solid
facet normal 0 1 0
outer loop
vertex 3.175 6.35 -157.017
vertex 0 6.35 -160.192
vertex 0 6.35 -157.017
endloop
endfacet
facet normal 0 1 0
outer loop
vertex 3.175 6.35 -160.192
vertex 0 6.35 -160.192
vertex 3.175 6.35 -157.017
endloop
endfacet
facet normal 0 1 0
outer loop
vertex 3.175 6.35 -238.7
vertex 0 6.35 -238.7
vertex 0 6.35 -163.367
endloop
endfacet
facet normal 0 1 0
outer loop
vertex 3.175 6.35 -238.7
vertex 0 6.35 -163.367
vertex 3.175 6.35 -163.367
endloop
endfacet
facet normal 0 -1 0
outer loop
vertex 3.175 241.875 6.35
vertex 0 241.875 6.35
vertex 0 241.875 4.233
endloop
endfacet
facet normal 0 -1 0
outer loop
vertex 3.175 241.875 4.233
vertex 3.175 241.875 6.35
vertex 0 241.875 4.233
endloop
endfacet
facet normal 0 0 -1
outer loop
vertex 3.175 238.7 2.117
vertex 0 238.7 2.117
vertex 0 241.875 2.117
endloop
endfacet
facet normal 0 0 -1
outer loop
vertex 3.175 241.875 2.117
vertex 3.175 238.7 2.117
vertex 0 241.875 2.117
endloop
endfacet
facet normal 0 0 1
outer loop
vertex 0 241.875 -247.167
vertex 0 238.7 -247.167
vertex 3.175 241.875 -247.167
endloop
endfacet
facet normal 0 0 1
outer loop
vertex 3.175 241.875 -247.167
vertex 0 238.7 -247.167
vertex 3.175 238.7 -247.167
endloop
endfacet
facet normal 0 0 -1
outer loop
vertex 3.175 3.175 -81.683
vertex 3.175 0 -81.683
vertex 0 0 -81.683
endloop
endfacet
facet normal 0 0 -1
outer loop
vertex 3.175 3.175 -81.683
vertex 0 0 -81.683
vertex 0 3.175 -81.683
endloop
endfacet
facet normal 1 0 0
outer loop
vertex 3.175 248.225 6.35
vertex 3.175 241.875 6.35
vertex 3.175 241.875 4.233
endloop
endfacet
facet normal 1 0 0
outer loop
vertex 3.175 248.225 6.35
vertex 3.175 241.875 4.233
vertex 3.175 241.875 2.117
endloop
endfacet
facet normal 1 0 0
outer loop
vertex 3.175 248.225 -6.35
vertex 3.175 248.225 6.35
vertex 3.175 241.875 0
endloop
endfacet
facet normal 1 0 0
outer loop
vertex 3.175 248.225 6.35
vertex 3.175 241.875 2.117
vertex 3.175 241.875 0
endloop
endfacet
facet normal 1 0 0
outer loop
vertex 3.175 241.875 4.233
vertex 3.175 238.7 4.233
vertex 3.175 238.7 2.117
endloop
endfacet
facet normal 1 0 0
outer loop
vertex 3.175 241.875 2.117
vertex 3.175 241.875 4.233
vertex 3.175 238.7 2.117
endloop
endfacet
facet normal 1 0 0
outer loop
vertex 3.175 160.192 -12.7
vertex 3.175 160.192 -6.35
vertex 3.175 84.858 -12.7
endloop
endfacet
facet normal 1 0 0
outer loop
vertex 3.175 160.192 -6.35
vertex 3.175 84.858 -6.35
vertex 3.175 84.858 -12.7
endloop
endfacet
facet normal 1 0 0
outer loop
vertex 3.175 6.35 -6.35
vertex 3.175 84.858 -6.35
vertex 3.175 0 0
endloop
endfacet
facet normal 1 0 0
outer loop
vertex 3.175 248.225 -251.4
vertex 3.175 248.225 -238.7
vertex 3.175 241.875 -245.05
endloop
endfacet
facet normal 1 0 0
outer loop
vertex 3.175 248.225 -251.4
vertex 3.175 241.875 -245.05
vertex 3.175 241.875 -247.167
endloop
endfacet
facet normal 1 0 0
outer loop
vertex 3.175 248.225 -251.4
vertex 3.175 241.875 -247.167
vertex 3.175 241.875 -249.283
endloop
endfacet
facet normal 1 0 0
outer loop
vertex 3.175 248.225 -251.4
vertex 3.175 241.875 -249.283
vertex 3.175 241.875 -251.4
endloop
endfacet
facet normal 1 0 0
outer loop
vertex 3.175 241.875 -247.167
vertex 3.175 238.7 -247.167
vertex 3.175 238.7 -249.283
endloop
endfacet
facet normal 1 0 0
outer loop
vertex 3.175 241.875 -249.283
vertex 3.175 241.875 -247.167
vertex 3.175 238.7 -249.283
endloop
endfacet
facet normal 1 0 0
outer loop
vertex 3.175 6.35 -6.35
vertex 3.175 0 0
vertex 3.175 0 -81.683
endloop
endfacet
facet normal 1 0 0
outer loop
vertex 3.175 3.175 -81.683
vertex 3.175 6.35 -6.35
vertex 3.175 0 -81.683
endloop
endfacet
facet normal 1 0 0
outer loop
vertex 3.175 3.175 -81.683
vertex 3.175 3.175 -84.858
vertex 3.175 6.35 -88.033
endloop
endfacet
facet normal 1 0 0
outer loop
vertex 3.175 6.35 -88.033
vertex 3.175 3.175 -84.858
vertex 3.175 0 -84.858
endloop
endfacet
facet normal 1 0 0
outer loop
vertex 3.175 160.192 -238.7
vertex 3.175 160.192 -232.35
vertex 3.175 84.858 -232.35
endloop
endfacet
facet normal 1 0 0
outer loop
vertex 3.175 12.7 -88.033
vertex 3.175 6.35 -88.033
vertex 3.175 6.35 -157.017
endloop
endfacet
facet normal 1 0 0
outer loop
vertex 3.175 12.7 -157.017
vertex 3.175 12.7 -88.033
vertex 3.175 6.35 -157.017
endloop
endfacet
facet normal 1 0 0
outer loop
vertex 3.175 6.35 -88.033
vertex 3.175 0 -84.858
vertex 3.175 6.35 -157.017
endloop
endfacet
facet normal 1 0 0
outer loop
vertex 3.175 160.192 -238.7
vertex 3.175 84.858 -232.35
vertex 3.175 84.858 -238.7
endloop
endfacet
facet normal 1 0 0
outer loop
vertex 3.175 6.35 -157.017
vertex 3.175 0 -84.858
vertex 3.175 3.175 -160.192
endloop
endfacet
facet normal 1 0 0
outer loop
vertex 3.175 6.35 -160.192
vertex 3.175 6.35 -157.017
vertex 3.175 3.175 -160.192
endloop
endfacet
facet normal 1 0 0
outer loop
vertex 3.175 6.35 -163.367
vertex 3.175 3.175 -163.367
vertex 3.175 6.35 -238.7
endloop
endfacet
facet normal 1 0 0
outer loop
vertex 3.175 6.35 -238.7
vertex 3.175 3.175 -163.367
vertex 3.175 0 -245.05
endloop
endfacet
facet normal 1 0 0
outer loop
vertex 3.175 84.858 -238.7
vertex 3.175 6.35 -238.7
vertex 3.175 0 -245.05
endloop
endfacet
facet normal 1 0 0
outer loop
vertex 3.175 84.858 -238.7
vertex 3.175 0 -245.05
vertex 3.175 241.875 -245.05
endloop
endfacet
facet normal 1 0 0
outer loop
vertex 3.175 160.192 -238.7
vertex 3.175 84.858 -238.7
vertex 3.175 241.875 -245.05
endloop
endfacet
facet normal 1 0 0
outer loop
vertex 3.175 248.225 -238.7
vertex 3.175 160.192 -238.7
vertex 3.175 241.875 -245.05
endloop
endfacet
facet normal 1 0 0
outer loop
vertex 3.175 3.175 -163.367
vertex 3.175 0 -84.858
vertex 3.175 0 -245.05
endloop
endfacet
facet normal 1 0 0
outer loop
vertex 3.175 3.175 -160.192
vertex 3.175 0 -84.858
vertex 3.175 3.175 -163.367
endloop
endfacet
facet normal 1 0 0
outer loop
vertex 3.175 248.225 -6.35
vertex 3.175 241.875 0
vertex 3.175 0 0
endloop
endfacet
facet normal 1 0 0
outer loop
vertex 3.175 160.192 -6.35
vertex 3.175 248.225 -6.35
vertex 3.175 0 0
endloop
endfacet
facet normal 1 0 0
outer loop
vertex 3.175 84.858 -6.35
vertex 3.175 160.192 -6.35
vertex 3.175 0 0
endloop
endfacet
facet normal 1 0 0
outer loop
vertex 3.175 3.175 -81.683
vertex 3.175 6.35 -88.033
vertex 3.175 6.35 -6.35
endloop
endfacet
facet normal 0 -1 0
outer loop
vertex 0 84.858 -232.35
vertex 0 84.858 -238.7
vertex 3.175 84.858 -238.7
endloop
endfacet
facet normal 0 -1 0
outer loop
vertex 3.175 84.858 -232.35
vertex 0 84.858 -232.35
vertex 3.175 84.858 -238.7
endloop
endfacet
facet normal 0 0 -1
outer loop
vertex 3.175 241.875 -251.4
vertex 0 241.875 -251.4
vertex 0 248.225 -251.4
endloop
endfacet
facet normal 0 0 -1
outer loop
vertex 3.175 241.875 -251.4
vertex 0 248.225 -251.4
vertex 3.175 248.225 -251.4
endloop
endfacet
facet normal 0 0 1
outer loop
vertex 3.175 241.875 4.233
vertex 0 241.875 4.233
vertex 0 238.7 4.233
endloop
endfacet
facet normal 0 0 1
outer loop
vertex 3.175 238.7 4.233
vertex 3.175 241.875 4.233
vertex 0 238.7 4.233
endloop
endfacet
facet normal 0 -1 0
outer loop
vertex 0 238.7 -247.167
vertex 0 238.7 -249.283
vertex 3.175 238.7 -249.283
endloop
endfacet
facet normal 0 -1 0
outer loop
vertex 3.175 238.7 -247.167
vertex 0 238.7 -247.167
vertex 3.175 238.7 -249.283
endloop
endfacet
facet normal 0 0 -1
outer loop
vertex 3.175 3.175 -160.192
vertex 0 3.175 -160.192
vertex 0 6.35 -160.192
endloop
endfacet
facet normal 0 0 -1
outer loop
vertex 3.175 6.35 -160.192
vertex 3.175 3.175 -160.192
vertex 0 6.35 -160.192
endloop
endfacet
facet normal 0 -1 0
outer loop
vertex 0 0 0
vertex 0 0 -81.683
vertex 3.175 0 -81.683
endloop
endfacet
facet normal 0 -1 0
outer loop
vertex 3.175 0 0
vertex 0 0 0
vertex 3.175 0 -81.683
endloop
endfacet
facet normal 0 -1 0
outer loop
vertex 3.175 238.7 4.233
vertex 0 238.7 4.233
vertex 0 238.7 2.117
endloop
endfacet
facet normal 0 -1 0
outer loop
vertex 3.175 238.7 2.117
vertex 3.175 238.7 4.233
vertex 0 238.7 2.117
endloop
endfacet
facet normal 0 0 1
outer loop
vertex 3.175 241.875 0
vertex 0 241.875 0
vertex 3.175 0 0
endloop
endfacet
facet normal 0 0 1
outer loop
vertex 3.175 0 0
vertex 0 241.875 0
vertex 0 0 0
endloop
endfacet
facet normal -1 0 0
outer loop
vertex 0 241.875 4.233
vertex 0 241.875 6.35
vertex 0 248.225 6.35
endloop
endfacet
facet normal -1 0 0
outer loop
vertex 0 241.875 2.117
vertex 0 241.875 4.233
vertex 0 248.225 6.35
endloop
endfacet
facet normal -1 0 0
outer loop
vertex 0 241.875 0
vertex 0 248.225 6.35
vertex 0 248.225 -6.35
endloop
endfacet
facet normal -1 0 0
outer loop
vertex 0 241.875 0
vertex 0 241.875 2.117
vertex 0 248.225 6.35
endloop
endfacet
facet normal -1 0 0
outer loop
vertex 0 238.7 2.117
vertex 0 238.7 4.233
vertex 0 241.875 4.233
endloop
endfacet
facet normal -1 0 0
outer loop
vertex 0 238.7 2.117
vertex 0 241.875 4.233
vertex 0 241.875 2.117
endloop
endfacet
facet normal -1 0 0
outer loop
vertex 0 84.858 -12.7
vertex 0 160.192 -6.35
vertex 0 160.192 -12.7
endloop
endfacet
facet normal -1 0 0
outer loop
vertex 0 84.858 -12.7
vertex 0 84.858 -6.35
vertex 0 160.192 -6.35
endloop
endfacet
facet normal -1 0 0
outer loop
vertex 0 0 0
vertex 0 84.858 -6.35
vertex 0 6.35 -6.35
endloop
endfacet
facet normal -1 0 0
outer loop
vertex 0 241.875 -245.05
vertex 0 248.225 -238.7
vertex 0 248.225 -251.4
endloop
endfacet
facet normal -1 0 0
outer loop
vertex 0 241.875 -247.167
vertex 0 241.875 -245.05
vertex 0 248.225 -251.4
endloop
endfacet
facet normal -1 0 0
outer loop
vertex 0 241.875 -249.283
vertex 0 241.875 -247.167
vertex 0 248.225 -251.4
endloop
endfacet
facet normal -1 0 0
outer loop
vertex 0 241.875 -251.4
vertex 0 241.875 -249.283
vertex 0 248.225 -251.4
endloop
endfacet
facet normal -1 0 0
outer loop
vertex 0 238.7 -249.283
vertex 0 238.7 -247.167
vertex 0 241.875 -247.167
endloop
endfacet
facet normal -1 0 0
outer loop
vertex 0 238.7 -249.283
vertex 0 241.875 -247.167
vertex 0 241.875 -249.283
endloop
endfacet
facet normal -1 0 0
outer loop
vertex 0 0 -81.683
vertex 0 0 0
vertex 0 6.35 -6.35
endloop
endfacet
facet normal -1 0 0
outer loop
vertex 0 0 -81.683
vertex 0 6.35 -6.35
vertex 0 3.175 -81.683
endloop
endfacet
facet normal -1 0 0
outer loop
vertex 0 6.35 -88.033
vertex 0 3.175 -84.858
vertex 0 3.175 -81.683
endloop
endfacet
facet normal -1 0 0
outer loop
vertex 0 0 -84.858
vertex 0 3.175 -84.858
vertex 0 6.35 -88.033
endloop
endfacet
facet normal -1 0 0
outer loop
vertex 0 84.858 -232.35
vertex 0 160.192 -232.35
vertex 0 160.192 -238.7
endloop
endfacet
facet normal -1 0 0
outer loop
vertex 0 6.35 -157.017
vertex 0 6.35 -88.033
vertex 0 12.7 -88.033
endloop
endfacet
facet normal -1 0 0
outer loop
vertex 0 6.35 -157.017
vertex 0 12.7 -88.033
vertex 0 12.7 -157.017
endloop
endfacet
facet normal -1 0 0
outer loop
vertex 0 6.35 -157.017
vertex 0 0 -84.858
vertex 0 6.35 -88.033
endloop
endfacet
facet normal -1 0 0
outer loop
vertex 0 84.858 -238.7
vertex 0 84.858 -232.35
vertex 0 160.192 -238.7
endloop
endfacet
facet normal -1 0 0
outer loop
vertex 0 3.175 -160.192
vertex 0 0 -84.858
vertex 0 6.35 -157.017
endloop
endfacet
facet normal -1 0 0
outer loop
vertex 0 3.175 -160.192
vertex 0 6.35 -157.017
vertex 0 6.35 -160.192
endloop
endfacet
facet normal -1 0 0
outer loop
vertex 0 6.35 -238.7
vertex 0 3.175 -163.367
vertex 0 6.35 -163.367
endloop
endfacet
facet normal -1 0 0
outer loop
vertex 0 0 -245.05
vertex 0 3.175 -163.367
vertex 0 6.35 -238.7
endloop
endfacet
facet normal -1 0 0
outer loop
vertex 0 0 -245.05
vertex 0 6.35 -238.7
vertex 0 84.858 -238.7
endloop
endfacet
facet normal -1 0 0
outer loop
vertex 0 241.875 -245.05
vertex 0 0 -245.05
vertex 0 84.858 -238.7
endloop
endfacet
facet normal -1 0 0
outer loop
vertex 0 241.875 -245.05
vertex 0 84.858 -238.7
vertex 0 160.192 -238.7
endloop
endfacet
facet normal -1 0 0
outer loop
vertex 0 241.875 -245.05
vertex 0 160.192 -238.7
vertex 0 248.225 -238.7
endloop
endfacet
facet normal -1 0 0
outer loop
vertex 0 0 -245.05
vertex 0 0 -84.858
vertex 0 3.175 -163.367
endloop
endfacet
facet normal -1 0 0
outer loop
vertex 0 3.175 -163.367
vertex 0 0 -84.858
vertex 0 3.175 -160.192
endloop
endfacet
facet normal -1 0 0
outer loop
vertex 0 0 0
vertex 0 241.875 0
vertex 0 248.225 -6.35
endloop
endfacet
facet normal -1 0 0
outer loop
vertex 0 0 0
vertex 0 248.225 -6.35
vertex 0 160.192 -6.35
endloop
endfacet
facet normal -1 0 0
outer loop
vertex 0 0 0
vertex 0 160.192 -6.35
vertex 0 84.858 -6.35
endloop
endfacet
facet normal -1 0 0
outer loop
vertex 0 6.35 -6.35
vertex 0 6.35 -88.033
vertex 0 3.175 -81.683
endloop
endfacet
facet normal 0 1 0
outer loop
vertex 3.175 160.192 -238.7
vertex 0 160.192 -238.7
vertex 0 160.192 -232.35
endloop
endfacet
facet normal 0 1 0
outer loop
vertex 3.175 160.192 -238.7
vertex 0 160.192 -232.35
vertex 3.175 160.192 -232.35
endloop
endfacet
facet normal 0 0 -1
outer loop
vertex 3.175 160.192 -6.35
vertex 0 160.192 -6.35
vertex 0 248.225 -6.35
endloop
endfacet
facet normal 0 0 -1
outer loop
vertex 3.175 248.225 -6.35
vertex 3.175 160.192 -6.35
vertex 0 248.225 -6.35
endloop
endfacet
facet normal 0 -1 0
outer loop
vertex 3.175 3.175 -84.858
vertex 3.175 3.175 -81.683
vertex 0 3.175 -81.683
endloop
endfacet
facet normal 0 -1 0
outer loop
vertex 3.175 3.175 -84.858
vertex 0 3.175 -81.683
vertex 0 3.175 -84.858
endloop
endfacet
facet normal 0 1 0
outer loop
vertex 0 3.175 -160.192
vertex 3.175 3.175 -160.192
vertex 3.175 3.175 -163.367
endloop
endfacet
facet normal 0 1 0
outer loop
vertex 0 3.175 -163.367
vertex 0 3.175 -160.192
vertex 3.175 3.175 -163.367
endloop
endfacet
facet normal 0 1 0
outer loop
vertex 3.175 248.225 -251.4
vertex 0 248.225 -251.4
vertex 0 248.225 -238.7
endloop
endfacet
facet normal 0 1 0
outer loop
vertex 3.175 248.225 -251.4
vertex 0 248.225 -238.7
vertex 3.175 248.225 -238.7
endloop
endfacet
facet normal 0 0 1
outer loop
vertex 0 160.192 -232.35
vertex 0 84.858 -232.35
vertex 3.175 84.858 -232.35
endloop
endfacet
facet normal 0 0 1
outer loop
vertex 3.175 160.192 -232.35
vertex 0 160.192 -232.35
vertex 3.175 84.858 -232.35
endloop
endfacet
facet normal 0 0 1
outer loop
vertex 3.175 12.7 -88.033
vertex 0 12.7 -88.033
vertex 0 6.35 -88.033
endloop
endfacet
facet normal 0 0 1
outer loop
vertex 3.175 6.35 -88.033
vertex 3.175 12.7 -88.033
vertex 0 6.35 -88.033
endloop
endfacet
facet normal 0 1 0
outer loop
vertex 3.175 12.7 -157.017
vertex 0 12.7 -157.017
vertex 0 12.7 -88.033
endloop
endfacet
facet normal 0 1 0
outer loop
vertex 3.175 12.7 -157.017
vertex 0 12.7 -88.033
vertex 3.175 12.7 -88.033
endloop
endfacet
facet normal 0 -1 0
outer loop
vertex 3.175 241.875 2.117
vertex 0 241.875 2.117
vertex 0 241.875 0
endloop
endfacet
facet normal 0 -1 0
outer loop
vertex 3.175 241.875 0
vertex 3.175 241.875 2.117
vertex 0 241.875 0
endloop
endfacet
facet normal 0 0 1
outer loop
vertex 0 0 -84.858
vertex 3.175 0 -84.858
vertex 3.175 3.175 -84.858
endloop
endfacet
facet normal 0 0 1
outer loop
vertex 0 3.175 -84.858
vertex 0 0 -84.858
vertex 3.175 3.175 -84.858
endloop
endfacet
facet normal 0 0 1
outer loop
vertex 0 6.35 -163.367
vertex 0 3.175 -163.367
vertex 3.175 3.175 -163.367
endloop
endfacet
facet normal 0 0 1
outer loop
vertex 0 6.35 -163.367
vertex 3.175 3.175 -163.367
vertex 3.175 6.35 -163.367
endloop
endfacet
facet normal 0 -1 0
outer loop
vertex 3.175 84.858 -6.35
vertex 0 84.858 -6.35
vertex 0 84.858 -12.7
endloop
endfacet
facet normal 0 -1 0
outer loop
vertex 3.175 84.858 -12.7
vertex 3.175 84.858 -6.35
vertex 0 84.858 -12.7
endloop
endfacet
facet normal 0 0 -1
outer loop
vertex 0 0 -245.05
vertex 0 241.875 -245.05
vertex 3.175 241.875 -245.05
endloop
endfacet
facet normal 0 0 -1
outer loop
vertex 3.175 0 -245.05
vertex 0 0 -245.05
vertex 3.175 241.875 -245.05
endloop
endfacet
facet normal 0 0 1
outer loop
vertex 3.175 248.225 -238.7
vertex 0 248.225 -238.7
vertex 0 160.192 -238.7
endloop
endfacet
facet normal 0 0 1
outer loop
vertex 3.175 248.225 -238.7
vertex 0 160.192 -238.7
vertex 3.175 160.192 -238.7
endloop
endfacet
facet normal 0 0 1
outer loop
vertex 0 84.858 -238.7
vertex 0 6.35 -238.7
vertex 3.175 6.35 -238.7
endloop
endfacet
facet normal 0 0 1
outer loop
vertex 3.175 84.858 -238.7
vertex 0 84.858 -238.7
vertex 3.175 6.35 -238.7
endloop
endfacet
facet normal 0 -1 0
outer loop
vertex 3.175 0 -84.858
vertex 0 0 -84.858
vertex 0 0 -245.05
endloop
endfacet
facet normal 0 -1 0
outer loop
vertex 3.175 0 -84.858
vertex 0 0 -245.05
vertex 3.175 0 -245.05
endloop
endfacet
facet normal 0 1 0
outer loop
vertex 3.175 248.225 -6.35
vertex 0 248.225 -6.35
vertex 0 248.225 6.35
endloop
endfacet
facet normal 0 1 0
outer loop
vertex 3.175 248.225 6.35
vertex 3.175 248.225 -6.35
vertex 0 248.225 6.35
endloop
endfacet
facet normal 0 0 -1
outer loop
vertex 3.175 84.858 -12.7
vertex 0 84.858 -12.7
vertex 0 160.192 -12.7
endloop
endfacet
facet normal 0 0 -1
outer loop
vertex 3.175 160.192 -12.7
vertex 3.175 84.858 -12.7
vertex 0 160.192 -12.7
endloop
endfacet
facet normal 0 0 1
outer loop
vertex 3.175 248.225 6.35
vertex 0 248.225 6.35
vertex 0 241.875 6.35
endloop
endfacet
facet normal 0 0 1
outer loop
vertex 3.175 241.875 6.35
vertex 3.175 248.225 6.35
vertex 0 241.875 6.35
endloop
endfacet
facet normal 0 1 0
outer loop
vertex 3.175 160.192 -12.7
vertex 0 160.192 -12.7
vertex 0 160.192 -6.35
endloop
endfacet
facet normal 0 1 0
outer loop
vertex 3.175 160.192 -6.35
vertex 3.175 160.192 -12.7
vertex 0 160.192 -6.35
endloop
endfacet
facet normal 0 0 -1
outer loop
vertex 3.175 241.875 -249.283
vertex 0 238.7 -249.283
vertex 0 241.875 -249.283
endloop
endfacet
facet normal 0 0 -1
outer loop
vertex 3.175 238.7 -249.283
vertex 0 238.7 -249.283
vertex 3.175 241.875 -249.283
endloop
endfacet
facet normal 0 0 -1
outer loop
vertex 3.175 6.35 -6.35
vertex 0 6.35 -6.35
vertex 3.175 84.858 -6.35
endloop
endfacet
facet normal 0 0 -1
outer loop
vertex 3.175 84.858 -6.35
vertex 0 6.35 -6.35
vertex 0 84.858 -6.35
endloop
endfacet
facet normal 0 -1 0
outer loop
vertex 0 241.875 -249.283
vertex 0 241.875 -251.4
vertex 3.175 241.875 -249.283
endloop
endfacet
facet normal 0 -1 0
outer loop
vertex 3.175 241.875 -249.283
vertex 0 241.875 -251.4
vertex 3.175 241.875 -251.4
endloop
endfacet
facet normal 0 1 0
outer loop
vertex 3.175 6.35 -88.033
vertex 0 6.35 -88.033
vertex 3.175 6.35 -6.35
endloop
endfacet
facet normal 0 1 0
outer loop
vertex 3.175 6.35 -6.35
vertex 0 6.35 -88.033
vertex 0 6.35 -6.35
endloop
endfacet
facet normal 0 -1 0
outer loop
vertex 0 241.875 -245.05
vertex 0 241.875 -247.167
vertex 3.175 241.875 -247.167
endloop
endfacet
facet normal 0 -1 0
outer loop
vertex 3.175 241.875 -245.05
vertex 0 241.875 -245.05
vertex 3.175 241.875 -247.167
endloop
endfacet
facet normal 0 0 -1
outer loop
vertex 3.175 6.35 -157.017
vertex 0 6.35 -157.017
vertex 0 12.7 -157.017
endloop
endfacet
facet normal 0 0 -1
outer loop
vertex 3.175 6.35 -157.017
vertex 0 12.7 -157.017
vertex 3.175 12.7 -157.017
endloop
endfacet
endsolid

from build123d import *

# Parameters (mm, degrees)
BOSS_EXTRUDE1_DEPTH = 3.175
MIRROR1_OUTLINE_W   = 3.175
MIRROR1_OUTLINE_H   = 6.35
MIRROR1_DEPTH       = 248.225
MIRROR1_2_OUTLINE_W = 3.175
MIRROR1_2_OUTLINE_H = 116.175
MIRROR1_2_DEPTH     = 6.35
MIRROR1_START       = 84.858333333
MIRROR1_3_OUTLINE_W = 3.175
MIRROR1_3_OUTLINE_H = 6.35
MIRROR1_3_DEPTH     = 75.333333334
MIRROR1_START_2     = 6.35
MIRROR1_4_OUTLINE_W = 3.175
MIRROR1_4_OUTLINE_H = 34.491666667
MIRROR1_4_DEPTH     = 6.35
MIRROR1_START_3     = 241.875
MIRROR1_5_OUTLINE_W = 3.175
MIRROR1_5_OUTLINE_H = 6.35
MIRROR1_5_DEPTH     = 6.35
MIRROR1_START_4     = 238.7
MIRROR1_6_OUTLINE_W = 3.175
MIRROR1_6_OUTLINE_H = 2.116666666
MIRROR1_6_DEPTH     = 3.175
SKETCH2_W           = 3.175
SKETCH2_H           = 3.175
CUT_EXTRUDE1_DEPTH  = 3.175


# Read off the part's stored shape, not the designer's step: Mirror1
with BuildPart() as part:
    # Sketch1 → Boss-Extrude1 (new body)
    with BuildSketch(Plane(origin=(0, 0, 0), x_dir=(0, 0, -1), z_dir=(1, 0, 0))):
        Polygon((6.35, 232.35), (0, 232.35), (0, 0), (122.525, 0), (122.525, 12.7), (88.033333333, 12.7), (88.033333333, 6.35), (6.35, 6.35), (6.35, 84.858333333), (12.7, 84.858333333), (12.7, 160.191666667), (6.35, 160.191666667), align=None)
        Polygon((-2.116666667, 241.875), (0, 241.875), (0, 232.35), (6.35, 232.35), (6.35, 248.225), (-6.35, 248.225), (-6.35, 241.875), (-4.233333333, 241.875), (-4.233333333, 238.7), (-2.116666667, 238.7), align=None)
    extrude(amount=BOSS_EXTRUDE1_DEPTH)



with BuildPart() as body_2:
    # Mirror1 outline → Mirror1 (new body)
    with BuildSketch(Plane(origin=(0, 0, 0), x_dir=(1, 0, 0), z_dir=(0, 1, 0))):
        with Locations((1.5875, 241.875)):
            Rectangle(MIRROR1_OUTLINE_W, MIRROR1_OUTLINE_H)
    extrude(amount=MIRROR1_DEPTH)


with BuildPart() as part_1:
    add(part.part)

    add(body_2.part)  # Mirror1 2 merges body 2
    # Mirror1 2 outline → Mirror1 2 (add)
    with BuildSketch(Plane(origin=(0, 0, 0), x_dir=(1, 0, 0), z_dir=(0, 1, 0))):
        with Locations((1.5875, 180.6125)):
            Rectangle(MIRROR1_2_OUTLINE_W, MIRROR1_2_OUTLINE_H)
    extrude(amount=MIRROR1_2_DEPTH)

    # Mirror1 3 outline → Mirror1 3 (add)
    with BuildSketch(Plane(origin=(0, 0, 0), x_dir=(1, 0, 0), z_dir=(0, 1, 0)).offset(MIRROR1_START)):
        with Locations((1.5875, 235.525)):
            Rectangle(MIRROR1_3_OUTLINE_W, MIRROR1_3_OUTLINE_H)
    extrude(amount=MIRROR1_3_DEPTH)

    # Mirror1 4 outline → Mirror1 4 (add)
    with BuildSketch(Plane(origin=(0, 0, 0), x_dir=(1, 0, 0), z_dir=(0, 1, 0)).offset(MIRROR1_START_2)):
        with Locations((1.5875, 139.770833334)):
            Rectangle(MIRROR1_4_OUTLINE_W, MIRROR1_4_OUTLINE_H)
    extrude(amount=MIRROR1_4_DEPTH)

    # Mirror1 5 outline → Mirror1 5 (add)
    with BuildSketch(Plane(origin=(0, 0, 0), x_dir=(1, 0, 0), z_dir=(0, 1, 0)).offset(MIRROR1_START_3)):
        with Locations((1.5875, 248.225)):
            Rectangle(MIRROR1_5_OUTLINE_W, MIRROR1_5_OUTLINE_H)
    extrude(amount=MIRROR1_5_DEPTH)

    # Mirror1 6 outline → Mirror1 6 (add)
    with BuildSketch(Plane(origin=(0, 0, 0), x_dir=(1, 0, 0), z_dir=(0, 1, 0)).offset(MIRROR1_START_4)):
        with Locations((1.5875, 248.225)):
            Rectangle(MIRROR1_6_OUTLINE_W, MIRROR1_6_OUTLINE_H)
    extrude(amount=MIRROR1_6_DEPTH)

    # Sketch2 → Cut-Extrude1 (cut)
    with BuildSketch(Plane(origin=(3.175, 0, 0), x_dir=(0, 0, -1), z_dir=(1, 0, 0))):
        with Locations((83.270833333, 1.5875)):
            Rectangle(SKETCH2_W, SKETCH2_H)
        with Locations((161.779166667, 4.7625)):
            Rectangle(SKETCH2_W, SKETCH2_H)
    extrude(amount=-CUT_EXTRUDE1_DEPTH, mode=Mode.SUBTRACT)


solid = part_1.part
